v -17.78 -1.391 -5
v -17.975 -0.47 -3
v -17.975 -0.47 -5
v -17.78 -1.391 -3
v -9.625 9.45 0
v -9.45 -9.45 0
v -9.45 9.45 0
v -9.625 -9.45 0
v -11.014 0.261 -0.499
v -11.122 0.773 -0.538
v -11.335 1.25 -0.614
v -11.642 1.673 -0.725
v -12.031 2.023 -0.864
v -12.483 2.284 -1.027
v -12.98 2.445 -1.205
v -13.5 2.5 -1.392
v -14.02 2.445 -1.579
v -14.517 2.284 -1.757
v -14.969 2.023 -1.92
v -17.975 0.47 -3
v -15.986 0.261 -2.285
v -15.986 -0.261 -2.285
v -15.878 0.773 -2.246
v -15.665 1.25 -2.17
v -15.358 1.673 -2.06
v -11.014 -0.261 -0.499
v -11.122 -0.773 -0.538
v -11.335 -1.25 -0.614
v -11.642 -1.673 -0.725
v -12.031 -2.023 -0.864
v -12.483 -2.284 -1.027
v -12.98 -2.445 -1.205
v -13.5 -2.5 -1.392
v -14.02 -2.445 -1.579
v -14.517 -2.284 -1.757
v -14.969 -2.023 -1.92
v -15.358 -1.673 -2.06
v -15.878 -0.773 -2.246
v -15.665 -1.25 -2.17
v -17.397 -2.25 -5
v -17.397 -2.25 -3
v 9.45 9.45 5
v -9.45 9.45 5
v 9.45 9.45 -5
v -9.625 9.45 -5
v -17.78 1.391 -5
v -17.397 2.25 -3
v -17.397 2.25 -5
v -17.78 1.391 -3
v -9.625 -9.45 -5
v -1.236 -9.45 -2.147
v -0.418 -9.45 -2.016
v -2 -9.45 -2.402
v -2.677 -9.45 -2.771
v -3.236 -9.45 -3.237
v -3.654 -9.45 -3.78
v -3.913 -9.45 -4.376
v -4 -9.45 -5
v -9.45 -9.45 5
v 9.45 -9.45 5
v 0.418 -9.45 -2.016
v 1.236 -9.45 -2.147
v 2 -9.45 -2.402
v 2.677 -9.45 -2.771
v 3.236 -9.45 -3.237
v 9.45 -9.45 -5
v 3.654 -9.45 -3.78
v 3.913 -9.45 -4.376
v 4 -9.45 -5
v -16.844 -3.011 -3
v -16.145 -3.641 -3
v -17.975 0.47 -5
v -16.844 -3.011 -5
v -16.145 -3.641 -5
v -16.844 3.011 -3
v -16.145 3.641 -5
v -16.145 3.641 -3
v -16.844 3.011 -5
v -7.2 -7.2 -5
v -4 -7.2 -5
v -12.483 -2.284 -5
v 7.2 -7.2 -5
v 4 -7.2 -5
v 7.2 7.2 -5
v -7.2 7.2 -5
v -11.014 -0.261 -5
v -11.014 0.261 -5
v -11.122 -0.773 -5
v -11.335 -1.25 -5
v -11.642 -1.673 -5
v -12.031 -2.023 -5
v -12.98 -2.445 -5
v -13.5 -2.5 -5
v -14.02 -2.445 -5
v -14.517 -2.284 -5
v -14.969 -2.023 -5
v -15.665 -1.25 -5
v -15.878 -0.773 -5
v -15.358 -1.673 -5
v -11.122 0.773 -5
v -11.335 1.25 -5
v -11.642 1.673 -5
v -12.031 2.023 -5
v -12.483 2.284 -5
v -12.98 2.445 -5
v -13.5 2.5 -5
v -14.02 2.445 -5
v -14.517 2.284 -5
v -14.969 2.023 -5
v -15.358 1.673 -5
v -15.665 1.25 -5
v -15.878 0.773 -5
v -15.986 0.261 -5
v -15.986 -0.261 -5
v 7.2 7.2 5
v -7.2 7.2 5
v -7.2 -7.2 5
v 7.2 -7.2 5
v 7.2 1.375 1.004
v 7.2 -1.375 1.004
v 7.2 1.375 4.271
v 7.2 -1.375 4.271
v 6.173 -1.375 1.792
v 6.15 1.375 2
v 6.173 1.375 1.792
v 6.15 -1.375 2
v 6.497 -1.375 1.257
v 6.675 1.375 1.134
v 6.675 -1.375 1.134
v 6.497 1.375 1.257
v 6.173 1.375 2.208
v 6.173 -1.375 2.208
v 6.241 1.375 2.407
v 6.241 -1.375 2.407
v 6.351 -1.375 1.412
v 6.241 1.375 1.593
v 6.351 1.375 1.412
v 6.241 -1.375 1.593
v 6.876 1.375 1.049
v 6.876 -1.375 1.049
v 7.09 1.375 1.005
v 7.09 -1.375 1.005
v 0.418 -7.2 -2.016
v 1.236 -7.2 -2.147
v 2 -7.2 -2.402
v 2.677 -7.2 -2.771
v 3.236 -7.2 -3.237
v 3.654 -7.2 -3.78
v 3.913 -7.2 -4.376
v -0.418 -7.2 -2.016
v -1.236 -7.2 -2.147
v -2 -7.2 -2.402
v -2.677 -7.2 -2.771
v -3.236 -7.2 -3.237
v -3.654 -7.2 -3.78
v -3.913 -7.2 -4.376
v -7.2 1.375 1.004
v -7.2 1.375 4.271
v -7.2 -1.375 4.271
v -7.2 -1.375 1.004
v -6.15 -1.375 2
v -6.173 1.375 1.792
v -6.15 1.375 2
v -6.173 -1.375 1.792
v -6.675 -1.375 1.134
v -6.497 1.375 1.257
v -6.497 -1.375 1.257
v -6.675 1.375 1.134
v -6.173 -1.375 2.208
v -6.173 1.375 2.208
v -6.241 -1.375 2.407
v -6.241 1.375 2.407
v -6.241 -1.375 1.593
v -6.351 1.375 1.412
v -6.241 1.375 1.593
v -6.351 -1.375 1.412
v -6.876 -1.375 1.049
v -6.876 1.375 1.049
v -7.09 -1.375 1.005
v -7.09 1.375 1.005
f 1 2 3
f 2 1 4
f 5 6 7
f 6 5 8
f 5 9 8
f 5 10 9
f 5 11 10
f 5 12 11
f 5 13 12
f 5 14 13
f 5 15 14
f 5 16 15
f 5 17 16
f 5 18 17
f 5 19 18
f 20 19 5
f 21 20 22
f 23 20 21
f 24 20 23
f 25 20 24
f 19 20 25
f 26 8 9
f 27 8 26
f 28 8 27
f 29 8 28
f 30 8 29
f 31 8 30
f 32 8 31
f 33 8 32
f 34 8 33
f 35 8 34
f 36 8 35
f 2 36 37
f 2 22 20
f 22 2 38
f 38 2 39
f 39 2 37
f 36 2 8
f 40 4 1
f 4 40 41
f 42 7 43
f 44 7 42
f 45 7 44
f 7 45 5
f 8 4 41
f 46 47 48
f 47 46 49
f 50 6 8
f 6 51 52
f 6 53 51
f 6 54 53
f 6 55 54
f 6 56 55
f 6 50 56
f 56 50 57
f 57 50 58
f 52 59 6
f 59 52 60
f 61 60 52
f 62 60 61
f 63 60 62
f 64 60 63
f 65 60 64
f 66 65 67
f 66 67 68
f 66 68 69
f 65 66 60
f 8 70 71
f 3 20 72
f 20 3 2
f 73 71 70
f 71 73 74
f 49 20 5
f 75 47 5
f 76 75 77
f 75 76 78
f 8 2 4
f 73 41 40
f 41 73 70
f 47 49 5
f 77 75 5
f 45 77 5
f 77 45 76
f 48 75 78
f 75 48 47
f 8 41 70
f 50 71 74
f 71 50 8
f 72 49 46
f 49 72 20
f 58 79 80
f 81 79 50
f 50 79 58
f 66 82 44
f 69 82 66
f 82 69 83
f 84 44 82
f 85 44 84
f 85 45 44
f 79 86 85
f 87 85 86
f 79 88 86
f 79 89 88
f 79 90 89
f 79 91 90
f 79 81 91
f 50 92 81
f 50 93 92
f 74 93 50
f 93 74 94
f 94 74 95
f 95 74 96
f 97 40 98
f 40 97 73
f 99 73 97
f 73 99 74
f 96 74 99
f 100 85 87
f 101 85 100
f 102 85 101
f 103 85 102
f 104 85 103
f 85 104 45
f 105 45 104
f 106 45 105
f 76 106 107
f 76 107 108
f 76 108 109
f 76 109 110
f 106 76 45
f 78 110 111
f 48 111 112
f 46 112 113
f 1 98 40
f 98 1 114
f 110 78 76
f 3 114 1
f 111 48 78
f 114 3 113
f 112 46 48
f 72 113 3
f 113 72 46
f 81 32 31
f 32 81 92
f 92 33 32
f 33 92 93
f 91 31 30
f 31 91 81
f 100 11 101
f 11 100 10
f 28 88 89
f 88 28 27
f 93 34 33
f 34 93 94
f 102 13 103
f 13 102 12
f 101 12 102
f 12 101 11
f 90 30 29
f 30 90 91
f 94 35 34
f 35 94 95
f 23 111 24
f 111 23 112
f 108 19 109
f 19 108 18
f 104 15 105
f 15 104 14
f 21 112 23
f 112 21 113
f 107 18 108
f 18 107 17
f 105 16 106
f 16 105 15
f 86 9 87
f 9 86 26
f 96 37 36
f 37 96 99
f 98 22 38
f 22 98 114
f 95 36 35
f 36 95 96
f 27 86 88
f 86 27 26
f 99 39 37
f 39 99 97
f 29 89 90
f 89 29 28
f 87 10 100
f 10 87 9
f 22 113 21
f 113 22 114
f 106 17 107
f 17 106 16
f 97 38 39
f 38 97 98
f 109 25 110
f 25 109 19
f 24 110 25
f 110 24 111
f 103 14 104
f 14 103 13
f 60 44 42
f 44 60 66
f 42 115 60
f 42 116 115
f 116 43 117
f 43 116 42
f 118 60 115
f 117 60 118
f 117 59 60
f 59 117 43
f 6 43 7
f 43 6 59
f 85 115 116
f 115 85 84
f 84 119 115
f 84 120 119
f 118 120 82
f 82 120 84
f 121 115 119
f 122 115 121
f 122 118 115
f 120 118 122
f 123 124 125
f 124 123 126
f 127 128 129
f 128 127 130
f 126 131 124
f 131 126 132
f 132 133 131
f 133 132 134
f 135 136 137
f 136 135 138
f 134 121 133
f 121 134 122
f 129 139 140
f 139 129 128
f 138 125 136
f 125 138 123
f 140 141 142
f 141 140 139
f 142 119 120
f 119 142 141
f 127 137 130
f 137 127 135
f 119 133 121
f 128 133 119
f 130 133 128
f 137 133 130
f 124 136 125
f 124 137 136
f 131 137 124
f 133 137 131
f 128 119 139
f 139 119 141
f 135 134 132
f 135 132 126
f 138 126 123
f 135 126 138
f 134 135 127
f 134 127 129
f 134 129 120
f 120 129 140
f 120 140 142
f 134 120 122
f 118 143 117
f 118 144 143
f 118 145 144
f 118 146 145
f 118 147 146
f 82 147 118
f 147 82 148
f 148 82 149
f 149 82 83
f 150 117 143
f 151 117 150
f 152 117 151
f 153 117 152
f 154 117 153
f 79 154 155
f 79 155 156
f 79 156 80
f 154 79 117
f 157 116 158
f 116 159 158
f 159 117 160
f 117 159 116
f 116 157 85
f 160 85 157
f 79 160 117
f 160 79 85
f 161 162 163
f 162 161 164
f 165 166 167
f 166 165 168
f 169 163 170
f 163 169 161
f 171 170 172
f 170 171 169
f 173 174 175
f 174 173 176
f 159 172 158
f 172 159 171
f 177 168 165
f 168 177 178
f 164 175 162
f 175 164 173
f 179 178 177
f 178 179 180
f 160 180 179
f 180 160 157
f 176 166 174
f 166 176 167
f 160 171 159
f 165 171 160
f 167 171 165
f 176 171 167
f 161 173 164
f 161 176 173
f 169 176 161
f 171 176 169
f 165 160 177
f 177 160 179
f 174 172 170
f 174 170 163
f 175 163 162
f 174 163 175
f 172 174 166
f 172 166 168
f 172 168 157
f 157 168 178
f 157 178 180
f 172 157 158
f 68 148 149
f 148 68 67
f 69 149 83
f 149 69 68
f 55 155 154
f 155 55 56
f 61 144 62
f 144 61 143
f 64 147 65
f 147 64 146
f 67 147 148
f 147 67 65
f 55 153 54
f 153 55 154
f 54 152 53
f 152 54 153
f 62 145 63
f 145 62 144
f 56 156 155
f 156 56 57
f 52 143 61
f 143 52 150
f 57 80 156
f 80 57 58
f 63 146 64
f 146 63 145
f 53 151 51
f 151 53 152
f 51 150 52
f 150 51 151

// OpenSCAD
module nub (){
	hull () {
		cube ([1.5, 2.75, 4], center=true);
		translate ([-1.125, 0, -1]) {
			rotate (a=90.0, v=[1, 0, 0]) {
				scale ([1.05, 1, 1]) {
					cylinder ($fn=30, h=2.75, r=1, center=true);
				}
			}
		}
	}
}
module twoAdjacentWalls(wallHeight){
	union () {
		translate ([0, 8.325, 0]) {
			cube ([18.9, 2.25, wallHeight], center=true);
		}
		translate ([8.325, 0, 0]) {
			cube ([2.25, 18.9, wallHeight], center=true);
		}
		translate([8.325, 0, wallHeight/2-2]){
			nub();
		}
	}
}

module switchBox(wallHeight=4){
	union () {
		twoAdjacentWalls(wallHeight);
		mirror ([0, 1, 0]) {
			mirror ([1, 0, 0]) {
				twoAdjacentWalls(wallHeight);
			}
		}
	}
}

module screwMount (thickness=2,screwSize=2.5,mountHeight=2){ 
	difference(){
		hull(){
			translate([0,2*screwSize,0]){
				mountPoint(mountHeight,thickness);
			}
			cylinder ($fn=30, h=thickness, r=screwSize+2, center=true);
		}
		cylinder ($fn=30, h=mountHeight*2, r=screwSize, center=true);
	}
}

module mountPoint(height=2,thickness=2) {
	translate([0,0,height/2-thickness/2]){
		cube ([18.9, 2.25, height], center=true);
	}
}

module wireHole(){
	translate([0,-9,-5]){
		rotate (a=90.0, v=[1, 0, 0]) {
			scale ([2, 1.5, 1]) {
				cylinder ($fn=30, h=4, r=2, center=true);
			}
		}
	}
}

module wallMountableSingleSwitchBox(){
	translate([-13.5,0,-4]){
		rotate([0,0,270]){
			screwMount(2,2.5,5);
		}
	}
	difference(){
		switchBox(10);
		wireHole();
	}
}

wallMountableSingleSwitchBox();
